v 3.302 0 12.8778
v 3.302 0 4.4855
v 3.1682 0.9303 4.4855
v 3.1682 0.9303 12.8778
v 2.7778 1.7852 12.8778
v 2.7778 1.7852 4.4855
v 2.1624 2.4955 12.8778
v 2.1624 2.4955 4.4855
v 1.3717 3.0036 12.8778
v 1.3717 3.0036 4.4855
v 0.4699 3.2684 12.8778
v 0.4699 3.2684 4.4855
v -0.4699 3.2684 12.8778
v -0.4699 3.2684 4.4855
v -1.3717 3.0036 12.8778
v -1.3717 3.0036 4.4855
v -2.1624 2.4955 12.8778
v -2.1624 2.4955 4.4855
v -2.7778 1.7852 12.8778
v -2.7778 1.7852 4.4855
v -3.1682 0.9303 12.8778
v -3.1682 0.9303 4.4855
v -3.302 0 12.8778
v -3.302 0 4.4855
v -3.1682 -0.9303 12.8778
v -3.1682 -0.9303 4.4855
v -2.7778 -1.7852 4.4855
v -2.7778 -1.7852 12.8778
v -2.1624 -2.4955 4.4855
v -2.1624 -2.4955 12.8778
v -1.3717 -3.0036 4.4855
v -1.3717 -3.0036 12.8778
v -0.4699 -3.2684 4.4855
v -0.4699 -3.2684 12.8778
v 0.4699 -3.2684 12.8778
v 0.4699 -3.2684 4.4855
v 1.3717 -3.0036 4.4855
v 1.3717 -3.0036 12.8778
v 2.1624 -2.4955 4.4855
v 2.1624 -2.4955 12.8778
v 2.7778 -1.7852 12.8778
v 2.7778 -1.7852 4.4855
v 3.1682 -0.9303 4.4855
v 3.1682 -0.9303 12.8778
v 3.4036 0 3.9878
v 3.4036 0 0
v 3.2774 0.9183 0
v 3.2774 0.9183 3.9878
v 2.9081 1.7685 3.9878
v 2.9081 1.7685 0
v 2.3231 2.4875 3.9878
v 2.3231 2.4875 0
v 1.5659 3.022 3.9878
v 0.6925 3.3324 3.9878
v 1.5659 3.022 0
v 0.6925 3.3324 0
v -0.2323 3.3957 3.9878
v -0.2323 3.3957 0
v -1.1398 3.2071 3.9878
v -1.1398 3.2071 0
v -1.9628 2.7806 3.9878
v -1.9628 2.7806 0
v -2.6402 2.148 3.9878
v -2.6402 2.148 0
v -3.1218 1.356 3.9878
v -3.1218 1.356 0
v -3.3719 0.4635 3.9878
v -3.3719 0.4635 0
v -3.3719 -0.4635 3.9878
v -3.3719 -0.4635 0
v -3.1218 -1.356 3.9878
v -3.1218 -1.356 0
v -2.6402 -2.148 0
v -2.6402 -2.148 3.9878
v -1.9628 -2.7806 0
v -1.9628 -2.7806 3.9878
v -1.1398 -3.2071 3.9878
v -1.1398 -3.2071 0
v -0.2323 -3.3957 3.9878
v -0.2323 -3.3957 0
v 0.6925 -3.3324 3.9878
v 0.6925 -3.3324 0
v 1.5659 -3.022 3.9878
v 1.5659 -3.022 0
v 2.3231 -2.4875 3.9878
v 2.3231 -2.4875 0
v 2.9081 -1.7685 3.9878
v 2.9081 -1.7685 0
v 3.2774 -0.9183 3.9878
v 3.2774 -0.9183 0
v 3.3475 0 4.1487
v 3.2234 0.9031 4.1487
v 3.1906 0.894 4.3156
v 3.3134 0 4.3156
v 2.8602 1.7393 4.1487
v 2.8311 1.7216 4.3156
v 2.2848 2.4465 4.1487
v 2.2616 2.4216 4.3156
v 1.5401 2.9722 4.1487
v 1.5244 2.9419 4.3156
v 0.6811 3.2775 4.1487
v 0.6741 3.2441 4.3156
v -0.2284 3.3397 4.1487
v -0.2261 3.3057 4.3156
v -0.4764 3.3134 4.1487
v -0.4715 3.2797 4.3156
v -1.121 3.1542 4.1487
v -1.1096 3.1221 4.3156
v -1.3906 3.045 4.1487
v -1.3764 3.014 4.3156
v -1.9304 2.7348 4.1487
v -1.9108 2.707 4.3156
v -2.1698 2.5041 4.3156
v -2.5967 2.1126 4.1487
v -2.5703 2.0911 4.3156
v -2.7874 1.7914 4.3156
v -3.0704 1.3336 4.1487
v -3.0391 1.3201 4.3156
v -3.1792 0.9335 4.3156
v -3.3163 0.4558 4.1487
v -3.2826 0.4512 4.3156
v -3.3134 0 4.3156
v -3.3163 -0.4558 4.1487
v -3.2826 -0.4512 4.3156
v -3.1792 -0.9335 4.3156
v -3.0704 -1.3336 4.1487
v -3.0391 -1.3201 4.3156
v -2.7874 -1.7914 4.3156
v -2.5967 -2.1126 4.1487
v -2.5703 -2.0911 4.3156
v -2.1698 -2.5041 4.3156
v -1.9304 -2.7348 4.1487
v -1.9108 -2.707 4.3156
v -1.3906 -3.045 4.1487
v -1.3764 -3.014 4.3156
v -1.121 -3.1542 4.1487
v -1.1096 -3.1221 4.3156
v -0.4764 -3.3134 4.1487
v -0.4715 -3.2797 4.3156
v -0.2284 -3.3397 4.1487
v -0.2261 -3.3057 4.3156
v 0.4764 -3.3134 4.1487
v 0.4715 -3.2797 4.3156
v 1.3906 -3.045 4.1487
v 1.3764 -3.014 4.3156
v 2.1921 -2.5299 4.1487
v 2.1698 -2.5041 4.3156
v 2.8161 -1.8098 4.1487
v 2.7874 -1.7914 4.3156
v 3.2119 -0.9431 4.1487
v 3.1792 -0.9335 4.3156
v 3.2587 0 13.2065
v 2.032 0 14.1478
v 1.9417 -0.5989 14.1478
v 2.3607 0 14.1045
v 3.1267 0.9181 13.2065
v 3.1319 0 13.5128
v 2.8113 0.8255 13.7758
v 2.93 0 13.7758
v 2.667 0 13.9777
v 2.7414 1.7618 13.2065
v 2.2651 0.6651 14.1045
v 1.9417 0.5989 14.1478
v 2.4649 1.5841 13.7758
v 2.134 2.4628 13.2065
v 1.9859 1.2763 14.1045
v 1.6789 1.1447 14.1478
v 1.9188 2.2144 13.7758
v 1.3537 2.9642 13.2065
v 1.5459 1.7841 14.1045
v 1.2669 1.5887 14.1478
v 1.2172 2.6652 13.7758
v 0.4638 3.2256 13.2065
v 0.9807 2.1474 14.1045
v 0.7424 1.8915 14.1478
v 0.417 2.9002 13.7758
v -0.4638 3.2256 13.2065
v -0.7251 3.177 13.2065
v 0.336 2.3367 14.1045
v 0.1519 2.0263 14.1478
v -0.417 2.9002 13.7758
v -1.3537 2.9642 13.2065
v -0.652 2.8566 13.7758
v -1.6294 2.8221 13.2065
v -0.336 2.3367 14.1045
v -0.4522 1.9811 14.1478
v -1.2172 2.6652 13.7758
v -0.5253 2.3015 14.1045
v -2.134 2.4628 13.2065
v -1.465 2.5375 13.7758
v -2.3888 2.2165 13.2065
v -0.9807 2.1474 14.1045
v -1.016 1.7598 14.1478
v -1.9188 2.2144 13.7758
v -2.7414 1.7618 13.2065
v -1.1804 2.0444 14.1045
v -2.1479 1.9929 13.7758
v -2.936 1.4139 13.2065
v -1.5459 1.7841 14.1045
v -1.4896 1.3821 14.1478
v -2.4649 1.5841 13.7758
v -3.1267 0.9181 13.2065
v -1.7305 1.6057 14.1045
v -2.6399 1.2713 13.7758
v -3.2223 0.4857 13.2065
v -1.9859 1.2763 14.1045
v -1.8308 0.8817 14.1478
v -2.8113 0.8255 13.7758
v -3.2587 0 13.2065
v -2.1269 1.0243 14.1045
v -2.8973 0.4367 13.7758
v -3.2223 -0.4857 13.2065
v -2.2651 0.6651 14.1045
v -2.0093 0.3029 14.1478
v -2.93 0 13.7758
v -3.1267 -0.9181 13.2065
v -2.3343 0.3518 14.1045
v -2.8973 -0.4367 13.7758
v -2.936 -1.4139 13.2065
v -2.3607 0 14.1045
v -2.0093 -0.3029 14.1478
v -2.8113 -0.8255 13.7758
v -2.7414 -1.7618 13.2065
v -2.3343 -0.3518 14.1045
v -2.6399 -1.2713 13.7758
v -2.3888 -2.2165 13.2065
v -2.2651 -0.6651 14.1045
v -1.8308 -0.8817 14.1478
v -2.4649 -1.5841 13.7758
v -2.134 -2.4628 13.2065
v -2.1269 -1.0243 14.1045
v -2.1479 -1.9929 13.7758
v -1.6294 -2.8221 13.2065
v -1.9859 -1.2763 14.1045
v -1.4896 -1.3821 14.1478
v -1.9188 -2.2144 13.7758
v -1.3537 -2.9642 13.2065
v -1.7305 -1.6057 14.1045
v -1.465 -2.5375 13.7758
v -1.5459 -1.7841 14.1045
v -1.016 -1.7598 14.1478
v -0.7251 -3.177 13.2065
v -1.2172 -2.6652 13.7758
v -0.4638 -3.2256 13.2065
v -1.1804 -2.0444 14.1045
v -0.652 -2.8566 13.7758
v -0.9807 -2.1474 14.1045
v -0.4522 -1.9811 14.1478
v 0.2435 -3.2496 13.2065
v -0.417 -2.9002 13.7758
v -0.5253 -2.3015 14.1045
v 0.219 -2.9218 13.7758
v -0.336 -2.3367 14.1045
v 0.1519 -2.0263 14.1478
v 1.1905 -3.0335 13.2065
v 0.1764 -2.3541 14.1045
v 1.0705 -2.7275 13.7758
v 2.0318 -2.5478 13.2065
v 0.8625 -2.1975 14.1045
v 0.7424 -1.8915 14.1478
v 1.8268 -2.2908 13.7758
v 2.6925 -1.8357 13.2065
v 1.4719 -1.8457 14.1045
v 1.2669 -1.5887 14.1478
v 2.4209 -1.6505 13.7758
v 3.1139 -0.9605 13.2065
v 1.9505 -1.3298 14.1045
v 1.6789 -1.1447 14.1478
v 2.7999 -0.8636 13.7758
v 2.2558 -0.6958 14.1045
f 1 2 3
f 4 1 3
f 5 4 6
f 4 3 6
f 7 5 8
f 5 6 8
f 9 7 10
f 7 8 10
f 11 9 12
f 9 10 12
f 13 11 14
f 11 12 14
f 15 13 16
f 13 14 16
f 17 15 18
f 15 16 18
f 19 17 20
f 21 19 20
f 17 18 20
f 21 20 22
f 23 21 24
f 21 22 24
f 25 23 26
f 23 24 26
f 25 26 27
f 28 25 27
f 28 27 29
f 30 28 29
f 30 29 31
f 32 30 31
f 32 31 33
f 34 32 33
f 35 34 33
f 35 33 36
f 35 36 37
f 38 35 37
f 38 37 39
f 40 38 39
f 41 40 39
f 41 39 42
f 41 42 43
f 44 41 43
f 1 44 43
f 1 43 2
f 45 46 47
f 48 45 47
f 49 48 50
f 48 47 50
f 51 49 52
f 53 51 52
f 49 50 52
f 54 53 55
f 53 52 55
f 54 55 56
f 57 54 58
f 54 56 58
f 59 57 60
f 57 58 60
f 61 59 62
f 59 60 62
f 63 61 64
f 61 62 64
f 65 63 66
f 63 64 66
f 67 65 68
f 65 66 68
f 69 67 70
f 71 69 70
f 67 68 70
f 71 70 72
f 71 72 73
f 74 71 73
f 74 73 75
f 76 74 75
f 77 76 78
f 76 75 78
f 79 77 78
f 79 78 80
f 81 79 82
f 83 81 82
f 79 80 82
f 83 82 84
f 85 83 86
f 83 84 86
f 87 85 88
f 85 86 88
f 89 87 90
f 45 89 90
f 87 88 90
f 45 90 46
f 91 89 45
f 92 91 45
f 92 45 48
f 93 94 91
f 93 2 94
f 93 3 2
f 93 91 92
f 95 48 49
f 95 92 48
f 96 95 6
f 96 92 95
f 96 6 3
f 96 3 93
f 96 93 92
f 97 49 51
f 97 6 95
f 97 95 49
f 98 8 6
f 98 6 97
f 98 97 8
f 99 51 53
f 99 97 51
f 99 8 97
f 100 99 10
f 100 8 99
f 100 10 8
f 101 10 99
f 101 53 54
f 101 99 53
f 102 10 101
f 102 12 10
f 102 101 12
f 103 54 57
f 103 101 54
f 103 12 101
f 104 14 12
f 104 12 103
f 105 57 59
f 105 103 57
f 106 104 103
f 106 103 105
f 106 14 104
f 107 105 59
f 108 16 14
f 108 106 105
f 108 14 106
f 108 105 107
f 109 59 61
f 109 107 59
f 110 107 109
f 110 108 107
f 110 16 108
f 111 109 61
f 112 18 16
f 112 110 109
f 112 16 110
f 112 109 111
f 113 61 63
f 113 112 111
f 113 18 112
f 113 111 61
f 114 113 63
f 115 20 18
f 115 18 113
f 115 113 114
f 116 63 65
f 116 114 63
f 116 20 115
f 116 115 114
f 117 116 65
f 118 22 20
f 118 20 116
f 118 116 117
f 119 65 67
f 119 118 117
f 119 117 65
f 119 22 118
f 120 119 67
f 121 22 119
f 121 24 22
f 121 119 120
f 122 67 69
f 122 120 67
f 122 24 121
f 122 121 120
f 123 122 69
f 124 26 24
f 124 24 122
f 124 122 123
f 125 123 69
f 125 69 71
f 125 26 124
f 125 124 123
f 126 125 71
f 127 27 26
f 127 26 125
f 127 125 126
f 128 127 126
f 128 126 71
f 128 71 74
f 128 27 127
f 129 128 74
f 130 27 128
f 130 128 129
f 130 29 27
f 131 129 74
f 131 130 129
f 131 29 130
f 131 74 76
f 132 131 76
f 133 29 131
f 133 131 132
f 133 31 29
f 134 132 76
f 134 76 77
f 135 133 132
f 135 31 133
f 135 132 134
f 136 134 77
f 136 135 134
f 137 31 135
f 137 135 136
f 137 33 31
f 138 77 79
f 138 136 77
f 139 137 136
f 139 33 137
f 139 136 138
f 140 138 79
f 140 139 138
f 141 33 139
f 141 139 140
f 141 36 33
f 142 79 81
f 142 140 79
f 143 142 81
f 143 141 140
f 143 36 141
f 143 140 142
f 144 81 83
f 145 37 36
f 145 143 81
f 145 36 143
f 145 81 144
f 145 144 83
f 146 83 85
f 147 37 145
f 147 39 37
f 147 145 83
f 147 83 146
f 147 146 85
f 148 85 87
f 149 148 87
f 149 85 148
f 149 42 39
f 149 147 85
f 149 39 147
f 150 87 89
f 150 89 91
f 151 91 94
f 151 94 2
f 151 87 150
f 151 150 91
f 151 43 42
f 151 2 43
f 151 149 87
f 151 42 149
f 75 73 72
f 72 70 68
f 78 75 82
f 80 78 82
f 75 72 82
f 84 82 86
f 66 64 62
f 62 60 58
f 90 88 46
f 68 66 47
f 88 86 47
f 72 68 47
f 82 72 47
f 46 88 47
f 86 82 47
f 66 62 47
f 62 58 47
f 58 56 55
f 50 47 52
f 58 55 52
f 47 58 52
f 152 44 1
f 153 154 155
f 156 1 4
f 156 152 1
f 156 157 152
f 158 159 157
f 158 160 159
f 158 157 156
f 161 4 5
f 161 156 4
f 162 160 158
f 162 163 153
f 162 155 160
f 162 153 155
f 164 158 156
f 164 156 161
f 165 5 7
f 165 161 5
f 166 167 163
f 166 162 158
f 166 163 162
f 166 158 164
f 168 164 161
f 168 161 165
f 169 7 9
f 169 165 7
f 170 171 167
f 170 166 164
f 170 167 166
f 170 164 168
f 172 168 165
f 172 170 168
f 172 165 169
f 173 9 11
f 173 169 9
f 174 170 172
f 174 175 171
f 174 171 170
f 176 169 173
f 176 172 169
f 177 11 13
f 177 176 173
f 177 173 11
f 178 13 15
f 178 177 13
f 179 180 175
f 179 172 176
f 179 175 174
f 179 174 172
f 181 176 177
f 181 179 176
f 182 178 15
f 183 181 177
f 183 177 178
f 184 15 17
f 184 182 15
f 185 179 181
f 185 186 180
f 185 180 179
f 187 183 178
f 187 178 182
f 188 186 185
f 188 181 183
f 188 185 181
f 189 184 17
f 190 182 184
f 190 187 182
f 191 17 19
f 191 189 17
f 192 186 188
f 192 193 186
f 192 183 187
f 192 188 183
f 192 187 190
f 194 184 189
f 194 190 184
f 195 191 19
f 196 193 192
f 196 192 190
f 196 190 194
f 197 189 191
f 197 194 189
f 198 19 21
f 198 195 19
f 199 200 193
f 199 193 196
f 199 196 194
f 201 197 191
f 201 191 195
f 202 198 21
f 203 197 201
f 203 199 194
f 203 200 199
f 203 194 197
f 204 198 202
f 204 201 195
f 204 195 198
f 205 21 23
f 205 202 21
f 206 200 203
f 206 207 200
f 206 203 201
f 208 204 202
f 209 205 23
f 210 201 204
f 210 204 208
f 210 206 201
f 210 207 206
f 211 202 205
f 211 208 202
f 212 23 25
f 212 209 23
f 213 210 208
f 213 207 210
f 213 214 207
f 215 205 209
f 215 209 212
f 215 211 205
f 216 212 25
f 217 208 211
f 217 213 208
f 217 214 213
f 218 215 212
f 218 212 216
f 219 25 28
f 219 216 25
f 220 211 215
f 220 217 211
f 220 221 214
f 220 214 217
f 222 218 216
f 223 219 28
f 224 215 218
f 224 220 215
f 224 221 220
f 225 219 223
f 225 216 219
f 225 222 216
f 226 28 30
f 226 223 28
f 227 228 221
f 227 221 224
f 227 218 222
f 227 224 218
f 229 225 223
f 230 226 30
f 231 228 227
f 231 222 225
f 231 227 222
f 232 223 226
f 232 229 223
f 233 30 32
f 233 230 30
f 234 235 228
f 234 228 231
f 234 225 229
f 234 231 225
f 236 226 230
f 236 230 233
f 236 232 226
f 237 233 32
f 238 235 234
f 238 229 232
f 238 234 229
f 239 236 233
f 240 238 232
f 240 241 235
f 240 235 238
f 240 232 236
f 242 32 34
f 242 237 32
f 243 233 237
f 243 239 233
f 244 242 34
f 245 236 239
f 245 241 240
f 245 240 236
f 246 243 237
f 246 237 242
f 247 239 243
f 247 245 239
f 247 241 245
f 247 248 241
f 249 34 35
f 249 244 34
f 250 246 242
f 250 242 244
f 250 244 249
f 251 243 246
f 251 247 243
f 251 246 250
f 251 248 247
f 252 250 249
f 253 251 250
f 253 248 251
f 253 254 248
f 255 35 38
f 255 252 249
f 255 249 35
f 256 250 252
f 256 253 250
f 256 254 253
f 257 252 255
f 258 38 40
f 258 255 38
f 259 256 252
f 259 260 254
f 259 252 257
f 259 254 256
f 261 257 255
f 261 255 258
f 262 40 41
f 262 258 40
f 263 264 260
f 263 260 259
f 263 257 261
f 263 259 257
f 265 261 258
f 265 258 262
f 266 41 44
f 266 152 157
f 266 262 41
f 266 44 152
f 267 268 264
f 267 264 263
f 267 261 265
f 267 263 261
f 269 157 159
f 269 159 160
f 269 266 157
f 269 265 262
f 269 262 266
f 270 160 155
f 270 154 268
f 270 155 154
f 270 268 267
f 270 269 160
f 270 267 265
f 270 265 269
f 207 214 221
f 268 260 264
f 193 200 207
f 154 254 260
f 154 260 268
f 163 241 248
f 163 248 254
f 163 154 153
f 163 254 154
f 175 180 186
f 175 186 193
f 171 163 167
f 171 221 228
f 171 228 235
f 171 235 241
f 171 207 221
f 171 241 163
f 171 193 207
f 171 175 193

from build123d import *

# Parameters (mm, degrees)
F0_R     = 3.4036
F1_DEPTH = 3.9878
F2_R     = 3.302
F3_DEPTH = 10.16


# Not quite as in the source:
# - a fillet or chamfer that OpenCascade refuses, or shapes differently, is made with other operations: its cross-section is extruded or revolved along the edge and cut away or added


with BuildPart() as f1:
    # F0 (on Top) → F1 (new body)
    with BuildSketch(Plane.XY):
        Circle(F0_R)
    extrude(amount=F1_DEPTH)

    # F2 (on face) → F3 (join)
    with BuildSketch(Plane.XY.offset(3.9878)):
        Circle(F2_R)
    extrude(amount=F3_DEPTH)

    # F4: fillet of radius 1.27 on 2 edges, made by hand

    # F4_s1 → F4_t2 (revolve)
    with BuildSketch(Plane.XZ):
        with BuildLine():
            ThreePointArc((3.4036, 3.9878), (3.3276592107, 4.2315363157), (3.302, 4.4855363157))
            Line((3.302, 4.4855363157), (3.302, 3.9878))
            Line((3.302, 3.9878), (3.4036, 3.9878))
        make_face()
    revolve(axis=Axis((0, 0, 3.9878), (0, 0, 1)))

    # F4_s3 → F4_t4 (revolve, cut)
    with BuildSketch(Plane.XZ):
        with BuildLine():
            ThreePointArc((3.302, 12.8778), (2.9300256121, 13.7758256121), (2.032, 14.1478))
            Line((2.032, 14.1478), (3.302, 14.1478))
            Line((3.302, 14.1478), (3.302, 12.8778))
        make_face()
    revolve(axis=Axis((0, 0, 14.1478), (0, 0, 1)), mode=Mode.SUBTRACT)


solid = f1.part
